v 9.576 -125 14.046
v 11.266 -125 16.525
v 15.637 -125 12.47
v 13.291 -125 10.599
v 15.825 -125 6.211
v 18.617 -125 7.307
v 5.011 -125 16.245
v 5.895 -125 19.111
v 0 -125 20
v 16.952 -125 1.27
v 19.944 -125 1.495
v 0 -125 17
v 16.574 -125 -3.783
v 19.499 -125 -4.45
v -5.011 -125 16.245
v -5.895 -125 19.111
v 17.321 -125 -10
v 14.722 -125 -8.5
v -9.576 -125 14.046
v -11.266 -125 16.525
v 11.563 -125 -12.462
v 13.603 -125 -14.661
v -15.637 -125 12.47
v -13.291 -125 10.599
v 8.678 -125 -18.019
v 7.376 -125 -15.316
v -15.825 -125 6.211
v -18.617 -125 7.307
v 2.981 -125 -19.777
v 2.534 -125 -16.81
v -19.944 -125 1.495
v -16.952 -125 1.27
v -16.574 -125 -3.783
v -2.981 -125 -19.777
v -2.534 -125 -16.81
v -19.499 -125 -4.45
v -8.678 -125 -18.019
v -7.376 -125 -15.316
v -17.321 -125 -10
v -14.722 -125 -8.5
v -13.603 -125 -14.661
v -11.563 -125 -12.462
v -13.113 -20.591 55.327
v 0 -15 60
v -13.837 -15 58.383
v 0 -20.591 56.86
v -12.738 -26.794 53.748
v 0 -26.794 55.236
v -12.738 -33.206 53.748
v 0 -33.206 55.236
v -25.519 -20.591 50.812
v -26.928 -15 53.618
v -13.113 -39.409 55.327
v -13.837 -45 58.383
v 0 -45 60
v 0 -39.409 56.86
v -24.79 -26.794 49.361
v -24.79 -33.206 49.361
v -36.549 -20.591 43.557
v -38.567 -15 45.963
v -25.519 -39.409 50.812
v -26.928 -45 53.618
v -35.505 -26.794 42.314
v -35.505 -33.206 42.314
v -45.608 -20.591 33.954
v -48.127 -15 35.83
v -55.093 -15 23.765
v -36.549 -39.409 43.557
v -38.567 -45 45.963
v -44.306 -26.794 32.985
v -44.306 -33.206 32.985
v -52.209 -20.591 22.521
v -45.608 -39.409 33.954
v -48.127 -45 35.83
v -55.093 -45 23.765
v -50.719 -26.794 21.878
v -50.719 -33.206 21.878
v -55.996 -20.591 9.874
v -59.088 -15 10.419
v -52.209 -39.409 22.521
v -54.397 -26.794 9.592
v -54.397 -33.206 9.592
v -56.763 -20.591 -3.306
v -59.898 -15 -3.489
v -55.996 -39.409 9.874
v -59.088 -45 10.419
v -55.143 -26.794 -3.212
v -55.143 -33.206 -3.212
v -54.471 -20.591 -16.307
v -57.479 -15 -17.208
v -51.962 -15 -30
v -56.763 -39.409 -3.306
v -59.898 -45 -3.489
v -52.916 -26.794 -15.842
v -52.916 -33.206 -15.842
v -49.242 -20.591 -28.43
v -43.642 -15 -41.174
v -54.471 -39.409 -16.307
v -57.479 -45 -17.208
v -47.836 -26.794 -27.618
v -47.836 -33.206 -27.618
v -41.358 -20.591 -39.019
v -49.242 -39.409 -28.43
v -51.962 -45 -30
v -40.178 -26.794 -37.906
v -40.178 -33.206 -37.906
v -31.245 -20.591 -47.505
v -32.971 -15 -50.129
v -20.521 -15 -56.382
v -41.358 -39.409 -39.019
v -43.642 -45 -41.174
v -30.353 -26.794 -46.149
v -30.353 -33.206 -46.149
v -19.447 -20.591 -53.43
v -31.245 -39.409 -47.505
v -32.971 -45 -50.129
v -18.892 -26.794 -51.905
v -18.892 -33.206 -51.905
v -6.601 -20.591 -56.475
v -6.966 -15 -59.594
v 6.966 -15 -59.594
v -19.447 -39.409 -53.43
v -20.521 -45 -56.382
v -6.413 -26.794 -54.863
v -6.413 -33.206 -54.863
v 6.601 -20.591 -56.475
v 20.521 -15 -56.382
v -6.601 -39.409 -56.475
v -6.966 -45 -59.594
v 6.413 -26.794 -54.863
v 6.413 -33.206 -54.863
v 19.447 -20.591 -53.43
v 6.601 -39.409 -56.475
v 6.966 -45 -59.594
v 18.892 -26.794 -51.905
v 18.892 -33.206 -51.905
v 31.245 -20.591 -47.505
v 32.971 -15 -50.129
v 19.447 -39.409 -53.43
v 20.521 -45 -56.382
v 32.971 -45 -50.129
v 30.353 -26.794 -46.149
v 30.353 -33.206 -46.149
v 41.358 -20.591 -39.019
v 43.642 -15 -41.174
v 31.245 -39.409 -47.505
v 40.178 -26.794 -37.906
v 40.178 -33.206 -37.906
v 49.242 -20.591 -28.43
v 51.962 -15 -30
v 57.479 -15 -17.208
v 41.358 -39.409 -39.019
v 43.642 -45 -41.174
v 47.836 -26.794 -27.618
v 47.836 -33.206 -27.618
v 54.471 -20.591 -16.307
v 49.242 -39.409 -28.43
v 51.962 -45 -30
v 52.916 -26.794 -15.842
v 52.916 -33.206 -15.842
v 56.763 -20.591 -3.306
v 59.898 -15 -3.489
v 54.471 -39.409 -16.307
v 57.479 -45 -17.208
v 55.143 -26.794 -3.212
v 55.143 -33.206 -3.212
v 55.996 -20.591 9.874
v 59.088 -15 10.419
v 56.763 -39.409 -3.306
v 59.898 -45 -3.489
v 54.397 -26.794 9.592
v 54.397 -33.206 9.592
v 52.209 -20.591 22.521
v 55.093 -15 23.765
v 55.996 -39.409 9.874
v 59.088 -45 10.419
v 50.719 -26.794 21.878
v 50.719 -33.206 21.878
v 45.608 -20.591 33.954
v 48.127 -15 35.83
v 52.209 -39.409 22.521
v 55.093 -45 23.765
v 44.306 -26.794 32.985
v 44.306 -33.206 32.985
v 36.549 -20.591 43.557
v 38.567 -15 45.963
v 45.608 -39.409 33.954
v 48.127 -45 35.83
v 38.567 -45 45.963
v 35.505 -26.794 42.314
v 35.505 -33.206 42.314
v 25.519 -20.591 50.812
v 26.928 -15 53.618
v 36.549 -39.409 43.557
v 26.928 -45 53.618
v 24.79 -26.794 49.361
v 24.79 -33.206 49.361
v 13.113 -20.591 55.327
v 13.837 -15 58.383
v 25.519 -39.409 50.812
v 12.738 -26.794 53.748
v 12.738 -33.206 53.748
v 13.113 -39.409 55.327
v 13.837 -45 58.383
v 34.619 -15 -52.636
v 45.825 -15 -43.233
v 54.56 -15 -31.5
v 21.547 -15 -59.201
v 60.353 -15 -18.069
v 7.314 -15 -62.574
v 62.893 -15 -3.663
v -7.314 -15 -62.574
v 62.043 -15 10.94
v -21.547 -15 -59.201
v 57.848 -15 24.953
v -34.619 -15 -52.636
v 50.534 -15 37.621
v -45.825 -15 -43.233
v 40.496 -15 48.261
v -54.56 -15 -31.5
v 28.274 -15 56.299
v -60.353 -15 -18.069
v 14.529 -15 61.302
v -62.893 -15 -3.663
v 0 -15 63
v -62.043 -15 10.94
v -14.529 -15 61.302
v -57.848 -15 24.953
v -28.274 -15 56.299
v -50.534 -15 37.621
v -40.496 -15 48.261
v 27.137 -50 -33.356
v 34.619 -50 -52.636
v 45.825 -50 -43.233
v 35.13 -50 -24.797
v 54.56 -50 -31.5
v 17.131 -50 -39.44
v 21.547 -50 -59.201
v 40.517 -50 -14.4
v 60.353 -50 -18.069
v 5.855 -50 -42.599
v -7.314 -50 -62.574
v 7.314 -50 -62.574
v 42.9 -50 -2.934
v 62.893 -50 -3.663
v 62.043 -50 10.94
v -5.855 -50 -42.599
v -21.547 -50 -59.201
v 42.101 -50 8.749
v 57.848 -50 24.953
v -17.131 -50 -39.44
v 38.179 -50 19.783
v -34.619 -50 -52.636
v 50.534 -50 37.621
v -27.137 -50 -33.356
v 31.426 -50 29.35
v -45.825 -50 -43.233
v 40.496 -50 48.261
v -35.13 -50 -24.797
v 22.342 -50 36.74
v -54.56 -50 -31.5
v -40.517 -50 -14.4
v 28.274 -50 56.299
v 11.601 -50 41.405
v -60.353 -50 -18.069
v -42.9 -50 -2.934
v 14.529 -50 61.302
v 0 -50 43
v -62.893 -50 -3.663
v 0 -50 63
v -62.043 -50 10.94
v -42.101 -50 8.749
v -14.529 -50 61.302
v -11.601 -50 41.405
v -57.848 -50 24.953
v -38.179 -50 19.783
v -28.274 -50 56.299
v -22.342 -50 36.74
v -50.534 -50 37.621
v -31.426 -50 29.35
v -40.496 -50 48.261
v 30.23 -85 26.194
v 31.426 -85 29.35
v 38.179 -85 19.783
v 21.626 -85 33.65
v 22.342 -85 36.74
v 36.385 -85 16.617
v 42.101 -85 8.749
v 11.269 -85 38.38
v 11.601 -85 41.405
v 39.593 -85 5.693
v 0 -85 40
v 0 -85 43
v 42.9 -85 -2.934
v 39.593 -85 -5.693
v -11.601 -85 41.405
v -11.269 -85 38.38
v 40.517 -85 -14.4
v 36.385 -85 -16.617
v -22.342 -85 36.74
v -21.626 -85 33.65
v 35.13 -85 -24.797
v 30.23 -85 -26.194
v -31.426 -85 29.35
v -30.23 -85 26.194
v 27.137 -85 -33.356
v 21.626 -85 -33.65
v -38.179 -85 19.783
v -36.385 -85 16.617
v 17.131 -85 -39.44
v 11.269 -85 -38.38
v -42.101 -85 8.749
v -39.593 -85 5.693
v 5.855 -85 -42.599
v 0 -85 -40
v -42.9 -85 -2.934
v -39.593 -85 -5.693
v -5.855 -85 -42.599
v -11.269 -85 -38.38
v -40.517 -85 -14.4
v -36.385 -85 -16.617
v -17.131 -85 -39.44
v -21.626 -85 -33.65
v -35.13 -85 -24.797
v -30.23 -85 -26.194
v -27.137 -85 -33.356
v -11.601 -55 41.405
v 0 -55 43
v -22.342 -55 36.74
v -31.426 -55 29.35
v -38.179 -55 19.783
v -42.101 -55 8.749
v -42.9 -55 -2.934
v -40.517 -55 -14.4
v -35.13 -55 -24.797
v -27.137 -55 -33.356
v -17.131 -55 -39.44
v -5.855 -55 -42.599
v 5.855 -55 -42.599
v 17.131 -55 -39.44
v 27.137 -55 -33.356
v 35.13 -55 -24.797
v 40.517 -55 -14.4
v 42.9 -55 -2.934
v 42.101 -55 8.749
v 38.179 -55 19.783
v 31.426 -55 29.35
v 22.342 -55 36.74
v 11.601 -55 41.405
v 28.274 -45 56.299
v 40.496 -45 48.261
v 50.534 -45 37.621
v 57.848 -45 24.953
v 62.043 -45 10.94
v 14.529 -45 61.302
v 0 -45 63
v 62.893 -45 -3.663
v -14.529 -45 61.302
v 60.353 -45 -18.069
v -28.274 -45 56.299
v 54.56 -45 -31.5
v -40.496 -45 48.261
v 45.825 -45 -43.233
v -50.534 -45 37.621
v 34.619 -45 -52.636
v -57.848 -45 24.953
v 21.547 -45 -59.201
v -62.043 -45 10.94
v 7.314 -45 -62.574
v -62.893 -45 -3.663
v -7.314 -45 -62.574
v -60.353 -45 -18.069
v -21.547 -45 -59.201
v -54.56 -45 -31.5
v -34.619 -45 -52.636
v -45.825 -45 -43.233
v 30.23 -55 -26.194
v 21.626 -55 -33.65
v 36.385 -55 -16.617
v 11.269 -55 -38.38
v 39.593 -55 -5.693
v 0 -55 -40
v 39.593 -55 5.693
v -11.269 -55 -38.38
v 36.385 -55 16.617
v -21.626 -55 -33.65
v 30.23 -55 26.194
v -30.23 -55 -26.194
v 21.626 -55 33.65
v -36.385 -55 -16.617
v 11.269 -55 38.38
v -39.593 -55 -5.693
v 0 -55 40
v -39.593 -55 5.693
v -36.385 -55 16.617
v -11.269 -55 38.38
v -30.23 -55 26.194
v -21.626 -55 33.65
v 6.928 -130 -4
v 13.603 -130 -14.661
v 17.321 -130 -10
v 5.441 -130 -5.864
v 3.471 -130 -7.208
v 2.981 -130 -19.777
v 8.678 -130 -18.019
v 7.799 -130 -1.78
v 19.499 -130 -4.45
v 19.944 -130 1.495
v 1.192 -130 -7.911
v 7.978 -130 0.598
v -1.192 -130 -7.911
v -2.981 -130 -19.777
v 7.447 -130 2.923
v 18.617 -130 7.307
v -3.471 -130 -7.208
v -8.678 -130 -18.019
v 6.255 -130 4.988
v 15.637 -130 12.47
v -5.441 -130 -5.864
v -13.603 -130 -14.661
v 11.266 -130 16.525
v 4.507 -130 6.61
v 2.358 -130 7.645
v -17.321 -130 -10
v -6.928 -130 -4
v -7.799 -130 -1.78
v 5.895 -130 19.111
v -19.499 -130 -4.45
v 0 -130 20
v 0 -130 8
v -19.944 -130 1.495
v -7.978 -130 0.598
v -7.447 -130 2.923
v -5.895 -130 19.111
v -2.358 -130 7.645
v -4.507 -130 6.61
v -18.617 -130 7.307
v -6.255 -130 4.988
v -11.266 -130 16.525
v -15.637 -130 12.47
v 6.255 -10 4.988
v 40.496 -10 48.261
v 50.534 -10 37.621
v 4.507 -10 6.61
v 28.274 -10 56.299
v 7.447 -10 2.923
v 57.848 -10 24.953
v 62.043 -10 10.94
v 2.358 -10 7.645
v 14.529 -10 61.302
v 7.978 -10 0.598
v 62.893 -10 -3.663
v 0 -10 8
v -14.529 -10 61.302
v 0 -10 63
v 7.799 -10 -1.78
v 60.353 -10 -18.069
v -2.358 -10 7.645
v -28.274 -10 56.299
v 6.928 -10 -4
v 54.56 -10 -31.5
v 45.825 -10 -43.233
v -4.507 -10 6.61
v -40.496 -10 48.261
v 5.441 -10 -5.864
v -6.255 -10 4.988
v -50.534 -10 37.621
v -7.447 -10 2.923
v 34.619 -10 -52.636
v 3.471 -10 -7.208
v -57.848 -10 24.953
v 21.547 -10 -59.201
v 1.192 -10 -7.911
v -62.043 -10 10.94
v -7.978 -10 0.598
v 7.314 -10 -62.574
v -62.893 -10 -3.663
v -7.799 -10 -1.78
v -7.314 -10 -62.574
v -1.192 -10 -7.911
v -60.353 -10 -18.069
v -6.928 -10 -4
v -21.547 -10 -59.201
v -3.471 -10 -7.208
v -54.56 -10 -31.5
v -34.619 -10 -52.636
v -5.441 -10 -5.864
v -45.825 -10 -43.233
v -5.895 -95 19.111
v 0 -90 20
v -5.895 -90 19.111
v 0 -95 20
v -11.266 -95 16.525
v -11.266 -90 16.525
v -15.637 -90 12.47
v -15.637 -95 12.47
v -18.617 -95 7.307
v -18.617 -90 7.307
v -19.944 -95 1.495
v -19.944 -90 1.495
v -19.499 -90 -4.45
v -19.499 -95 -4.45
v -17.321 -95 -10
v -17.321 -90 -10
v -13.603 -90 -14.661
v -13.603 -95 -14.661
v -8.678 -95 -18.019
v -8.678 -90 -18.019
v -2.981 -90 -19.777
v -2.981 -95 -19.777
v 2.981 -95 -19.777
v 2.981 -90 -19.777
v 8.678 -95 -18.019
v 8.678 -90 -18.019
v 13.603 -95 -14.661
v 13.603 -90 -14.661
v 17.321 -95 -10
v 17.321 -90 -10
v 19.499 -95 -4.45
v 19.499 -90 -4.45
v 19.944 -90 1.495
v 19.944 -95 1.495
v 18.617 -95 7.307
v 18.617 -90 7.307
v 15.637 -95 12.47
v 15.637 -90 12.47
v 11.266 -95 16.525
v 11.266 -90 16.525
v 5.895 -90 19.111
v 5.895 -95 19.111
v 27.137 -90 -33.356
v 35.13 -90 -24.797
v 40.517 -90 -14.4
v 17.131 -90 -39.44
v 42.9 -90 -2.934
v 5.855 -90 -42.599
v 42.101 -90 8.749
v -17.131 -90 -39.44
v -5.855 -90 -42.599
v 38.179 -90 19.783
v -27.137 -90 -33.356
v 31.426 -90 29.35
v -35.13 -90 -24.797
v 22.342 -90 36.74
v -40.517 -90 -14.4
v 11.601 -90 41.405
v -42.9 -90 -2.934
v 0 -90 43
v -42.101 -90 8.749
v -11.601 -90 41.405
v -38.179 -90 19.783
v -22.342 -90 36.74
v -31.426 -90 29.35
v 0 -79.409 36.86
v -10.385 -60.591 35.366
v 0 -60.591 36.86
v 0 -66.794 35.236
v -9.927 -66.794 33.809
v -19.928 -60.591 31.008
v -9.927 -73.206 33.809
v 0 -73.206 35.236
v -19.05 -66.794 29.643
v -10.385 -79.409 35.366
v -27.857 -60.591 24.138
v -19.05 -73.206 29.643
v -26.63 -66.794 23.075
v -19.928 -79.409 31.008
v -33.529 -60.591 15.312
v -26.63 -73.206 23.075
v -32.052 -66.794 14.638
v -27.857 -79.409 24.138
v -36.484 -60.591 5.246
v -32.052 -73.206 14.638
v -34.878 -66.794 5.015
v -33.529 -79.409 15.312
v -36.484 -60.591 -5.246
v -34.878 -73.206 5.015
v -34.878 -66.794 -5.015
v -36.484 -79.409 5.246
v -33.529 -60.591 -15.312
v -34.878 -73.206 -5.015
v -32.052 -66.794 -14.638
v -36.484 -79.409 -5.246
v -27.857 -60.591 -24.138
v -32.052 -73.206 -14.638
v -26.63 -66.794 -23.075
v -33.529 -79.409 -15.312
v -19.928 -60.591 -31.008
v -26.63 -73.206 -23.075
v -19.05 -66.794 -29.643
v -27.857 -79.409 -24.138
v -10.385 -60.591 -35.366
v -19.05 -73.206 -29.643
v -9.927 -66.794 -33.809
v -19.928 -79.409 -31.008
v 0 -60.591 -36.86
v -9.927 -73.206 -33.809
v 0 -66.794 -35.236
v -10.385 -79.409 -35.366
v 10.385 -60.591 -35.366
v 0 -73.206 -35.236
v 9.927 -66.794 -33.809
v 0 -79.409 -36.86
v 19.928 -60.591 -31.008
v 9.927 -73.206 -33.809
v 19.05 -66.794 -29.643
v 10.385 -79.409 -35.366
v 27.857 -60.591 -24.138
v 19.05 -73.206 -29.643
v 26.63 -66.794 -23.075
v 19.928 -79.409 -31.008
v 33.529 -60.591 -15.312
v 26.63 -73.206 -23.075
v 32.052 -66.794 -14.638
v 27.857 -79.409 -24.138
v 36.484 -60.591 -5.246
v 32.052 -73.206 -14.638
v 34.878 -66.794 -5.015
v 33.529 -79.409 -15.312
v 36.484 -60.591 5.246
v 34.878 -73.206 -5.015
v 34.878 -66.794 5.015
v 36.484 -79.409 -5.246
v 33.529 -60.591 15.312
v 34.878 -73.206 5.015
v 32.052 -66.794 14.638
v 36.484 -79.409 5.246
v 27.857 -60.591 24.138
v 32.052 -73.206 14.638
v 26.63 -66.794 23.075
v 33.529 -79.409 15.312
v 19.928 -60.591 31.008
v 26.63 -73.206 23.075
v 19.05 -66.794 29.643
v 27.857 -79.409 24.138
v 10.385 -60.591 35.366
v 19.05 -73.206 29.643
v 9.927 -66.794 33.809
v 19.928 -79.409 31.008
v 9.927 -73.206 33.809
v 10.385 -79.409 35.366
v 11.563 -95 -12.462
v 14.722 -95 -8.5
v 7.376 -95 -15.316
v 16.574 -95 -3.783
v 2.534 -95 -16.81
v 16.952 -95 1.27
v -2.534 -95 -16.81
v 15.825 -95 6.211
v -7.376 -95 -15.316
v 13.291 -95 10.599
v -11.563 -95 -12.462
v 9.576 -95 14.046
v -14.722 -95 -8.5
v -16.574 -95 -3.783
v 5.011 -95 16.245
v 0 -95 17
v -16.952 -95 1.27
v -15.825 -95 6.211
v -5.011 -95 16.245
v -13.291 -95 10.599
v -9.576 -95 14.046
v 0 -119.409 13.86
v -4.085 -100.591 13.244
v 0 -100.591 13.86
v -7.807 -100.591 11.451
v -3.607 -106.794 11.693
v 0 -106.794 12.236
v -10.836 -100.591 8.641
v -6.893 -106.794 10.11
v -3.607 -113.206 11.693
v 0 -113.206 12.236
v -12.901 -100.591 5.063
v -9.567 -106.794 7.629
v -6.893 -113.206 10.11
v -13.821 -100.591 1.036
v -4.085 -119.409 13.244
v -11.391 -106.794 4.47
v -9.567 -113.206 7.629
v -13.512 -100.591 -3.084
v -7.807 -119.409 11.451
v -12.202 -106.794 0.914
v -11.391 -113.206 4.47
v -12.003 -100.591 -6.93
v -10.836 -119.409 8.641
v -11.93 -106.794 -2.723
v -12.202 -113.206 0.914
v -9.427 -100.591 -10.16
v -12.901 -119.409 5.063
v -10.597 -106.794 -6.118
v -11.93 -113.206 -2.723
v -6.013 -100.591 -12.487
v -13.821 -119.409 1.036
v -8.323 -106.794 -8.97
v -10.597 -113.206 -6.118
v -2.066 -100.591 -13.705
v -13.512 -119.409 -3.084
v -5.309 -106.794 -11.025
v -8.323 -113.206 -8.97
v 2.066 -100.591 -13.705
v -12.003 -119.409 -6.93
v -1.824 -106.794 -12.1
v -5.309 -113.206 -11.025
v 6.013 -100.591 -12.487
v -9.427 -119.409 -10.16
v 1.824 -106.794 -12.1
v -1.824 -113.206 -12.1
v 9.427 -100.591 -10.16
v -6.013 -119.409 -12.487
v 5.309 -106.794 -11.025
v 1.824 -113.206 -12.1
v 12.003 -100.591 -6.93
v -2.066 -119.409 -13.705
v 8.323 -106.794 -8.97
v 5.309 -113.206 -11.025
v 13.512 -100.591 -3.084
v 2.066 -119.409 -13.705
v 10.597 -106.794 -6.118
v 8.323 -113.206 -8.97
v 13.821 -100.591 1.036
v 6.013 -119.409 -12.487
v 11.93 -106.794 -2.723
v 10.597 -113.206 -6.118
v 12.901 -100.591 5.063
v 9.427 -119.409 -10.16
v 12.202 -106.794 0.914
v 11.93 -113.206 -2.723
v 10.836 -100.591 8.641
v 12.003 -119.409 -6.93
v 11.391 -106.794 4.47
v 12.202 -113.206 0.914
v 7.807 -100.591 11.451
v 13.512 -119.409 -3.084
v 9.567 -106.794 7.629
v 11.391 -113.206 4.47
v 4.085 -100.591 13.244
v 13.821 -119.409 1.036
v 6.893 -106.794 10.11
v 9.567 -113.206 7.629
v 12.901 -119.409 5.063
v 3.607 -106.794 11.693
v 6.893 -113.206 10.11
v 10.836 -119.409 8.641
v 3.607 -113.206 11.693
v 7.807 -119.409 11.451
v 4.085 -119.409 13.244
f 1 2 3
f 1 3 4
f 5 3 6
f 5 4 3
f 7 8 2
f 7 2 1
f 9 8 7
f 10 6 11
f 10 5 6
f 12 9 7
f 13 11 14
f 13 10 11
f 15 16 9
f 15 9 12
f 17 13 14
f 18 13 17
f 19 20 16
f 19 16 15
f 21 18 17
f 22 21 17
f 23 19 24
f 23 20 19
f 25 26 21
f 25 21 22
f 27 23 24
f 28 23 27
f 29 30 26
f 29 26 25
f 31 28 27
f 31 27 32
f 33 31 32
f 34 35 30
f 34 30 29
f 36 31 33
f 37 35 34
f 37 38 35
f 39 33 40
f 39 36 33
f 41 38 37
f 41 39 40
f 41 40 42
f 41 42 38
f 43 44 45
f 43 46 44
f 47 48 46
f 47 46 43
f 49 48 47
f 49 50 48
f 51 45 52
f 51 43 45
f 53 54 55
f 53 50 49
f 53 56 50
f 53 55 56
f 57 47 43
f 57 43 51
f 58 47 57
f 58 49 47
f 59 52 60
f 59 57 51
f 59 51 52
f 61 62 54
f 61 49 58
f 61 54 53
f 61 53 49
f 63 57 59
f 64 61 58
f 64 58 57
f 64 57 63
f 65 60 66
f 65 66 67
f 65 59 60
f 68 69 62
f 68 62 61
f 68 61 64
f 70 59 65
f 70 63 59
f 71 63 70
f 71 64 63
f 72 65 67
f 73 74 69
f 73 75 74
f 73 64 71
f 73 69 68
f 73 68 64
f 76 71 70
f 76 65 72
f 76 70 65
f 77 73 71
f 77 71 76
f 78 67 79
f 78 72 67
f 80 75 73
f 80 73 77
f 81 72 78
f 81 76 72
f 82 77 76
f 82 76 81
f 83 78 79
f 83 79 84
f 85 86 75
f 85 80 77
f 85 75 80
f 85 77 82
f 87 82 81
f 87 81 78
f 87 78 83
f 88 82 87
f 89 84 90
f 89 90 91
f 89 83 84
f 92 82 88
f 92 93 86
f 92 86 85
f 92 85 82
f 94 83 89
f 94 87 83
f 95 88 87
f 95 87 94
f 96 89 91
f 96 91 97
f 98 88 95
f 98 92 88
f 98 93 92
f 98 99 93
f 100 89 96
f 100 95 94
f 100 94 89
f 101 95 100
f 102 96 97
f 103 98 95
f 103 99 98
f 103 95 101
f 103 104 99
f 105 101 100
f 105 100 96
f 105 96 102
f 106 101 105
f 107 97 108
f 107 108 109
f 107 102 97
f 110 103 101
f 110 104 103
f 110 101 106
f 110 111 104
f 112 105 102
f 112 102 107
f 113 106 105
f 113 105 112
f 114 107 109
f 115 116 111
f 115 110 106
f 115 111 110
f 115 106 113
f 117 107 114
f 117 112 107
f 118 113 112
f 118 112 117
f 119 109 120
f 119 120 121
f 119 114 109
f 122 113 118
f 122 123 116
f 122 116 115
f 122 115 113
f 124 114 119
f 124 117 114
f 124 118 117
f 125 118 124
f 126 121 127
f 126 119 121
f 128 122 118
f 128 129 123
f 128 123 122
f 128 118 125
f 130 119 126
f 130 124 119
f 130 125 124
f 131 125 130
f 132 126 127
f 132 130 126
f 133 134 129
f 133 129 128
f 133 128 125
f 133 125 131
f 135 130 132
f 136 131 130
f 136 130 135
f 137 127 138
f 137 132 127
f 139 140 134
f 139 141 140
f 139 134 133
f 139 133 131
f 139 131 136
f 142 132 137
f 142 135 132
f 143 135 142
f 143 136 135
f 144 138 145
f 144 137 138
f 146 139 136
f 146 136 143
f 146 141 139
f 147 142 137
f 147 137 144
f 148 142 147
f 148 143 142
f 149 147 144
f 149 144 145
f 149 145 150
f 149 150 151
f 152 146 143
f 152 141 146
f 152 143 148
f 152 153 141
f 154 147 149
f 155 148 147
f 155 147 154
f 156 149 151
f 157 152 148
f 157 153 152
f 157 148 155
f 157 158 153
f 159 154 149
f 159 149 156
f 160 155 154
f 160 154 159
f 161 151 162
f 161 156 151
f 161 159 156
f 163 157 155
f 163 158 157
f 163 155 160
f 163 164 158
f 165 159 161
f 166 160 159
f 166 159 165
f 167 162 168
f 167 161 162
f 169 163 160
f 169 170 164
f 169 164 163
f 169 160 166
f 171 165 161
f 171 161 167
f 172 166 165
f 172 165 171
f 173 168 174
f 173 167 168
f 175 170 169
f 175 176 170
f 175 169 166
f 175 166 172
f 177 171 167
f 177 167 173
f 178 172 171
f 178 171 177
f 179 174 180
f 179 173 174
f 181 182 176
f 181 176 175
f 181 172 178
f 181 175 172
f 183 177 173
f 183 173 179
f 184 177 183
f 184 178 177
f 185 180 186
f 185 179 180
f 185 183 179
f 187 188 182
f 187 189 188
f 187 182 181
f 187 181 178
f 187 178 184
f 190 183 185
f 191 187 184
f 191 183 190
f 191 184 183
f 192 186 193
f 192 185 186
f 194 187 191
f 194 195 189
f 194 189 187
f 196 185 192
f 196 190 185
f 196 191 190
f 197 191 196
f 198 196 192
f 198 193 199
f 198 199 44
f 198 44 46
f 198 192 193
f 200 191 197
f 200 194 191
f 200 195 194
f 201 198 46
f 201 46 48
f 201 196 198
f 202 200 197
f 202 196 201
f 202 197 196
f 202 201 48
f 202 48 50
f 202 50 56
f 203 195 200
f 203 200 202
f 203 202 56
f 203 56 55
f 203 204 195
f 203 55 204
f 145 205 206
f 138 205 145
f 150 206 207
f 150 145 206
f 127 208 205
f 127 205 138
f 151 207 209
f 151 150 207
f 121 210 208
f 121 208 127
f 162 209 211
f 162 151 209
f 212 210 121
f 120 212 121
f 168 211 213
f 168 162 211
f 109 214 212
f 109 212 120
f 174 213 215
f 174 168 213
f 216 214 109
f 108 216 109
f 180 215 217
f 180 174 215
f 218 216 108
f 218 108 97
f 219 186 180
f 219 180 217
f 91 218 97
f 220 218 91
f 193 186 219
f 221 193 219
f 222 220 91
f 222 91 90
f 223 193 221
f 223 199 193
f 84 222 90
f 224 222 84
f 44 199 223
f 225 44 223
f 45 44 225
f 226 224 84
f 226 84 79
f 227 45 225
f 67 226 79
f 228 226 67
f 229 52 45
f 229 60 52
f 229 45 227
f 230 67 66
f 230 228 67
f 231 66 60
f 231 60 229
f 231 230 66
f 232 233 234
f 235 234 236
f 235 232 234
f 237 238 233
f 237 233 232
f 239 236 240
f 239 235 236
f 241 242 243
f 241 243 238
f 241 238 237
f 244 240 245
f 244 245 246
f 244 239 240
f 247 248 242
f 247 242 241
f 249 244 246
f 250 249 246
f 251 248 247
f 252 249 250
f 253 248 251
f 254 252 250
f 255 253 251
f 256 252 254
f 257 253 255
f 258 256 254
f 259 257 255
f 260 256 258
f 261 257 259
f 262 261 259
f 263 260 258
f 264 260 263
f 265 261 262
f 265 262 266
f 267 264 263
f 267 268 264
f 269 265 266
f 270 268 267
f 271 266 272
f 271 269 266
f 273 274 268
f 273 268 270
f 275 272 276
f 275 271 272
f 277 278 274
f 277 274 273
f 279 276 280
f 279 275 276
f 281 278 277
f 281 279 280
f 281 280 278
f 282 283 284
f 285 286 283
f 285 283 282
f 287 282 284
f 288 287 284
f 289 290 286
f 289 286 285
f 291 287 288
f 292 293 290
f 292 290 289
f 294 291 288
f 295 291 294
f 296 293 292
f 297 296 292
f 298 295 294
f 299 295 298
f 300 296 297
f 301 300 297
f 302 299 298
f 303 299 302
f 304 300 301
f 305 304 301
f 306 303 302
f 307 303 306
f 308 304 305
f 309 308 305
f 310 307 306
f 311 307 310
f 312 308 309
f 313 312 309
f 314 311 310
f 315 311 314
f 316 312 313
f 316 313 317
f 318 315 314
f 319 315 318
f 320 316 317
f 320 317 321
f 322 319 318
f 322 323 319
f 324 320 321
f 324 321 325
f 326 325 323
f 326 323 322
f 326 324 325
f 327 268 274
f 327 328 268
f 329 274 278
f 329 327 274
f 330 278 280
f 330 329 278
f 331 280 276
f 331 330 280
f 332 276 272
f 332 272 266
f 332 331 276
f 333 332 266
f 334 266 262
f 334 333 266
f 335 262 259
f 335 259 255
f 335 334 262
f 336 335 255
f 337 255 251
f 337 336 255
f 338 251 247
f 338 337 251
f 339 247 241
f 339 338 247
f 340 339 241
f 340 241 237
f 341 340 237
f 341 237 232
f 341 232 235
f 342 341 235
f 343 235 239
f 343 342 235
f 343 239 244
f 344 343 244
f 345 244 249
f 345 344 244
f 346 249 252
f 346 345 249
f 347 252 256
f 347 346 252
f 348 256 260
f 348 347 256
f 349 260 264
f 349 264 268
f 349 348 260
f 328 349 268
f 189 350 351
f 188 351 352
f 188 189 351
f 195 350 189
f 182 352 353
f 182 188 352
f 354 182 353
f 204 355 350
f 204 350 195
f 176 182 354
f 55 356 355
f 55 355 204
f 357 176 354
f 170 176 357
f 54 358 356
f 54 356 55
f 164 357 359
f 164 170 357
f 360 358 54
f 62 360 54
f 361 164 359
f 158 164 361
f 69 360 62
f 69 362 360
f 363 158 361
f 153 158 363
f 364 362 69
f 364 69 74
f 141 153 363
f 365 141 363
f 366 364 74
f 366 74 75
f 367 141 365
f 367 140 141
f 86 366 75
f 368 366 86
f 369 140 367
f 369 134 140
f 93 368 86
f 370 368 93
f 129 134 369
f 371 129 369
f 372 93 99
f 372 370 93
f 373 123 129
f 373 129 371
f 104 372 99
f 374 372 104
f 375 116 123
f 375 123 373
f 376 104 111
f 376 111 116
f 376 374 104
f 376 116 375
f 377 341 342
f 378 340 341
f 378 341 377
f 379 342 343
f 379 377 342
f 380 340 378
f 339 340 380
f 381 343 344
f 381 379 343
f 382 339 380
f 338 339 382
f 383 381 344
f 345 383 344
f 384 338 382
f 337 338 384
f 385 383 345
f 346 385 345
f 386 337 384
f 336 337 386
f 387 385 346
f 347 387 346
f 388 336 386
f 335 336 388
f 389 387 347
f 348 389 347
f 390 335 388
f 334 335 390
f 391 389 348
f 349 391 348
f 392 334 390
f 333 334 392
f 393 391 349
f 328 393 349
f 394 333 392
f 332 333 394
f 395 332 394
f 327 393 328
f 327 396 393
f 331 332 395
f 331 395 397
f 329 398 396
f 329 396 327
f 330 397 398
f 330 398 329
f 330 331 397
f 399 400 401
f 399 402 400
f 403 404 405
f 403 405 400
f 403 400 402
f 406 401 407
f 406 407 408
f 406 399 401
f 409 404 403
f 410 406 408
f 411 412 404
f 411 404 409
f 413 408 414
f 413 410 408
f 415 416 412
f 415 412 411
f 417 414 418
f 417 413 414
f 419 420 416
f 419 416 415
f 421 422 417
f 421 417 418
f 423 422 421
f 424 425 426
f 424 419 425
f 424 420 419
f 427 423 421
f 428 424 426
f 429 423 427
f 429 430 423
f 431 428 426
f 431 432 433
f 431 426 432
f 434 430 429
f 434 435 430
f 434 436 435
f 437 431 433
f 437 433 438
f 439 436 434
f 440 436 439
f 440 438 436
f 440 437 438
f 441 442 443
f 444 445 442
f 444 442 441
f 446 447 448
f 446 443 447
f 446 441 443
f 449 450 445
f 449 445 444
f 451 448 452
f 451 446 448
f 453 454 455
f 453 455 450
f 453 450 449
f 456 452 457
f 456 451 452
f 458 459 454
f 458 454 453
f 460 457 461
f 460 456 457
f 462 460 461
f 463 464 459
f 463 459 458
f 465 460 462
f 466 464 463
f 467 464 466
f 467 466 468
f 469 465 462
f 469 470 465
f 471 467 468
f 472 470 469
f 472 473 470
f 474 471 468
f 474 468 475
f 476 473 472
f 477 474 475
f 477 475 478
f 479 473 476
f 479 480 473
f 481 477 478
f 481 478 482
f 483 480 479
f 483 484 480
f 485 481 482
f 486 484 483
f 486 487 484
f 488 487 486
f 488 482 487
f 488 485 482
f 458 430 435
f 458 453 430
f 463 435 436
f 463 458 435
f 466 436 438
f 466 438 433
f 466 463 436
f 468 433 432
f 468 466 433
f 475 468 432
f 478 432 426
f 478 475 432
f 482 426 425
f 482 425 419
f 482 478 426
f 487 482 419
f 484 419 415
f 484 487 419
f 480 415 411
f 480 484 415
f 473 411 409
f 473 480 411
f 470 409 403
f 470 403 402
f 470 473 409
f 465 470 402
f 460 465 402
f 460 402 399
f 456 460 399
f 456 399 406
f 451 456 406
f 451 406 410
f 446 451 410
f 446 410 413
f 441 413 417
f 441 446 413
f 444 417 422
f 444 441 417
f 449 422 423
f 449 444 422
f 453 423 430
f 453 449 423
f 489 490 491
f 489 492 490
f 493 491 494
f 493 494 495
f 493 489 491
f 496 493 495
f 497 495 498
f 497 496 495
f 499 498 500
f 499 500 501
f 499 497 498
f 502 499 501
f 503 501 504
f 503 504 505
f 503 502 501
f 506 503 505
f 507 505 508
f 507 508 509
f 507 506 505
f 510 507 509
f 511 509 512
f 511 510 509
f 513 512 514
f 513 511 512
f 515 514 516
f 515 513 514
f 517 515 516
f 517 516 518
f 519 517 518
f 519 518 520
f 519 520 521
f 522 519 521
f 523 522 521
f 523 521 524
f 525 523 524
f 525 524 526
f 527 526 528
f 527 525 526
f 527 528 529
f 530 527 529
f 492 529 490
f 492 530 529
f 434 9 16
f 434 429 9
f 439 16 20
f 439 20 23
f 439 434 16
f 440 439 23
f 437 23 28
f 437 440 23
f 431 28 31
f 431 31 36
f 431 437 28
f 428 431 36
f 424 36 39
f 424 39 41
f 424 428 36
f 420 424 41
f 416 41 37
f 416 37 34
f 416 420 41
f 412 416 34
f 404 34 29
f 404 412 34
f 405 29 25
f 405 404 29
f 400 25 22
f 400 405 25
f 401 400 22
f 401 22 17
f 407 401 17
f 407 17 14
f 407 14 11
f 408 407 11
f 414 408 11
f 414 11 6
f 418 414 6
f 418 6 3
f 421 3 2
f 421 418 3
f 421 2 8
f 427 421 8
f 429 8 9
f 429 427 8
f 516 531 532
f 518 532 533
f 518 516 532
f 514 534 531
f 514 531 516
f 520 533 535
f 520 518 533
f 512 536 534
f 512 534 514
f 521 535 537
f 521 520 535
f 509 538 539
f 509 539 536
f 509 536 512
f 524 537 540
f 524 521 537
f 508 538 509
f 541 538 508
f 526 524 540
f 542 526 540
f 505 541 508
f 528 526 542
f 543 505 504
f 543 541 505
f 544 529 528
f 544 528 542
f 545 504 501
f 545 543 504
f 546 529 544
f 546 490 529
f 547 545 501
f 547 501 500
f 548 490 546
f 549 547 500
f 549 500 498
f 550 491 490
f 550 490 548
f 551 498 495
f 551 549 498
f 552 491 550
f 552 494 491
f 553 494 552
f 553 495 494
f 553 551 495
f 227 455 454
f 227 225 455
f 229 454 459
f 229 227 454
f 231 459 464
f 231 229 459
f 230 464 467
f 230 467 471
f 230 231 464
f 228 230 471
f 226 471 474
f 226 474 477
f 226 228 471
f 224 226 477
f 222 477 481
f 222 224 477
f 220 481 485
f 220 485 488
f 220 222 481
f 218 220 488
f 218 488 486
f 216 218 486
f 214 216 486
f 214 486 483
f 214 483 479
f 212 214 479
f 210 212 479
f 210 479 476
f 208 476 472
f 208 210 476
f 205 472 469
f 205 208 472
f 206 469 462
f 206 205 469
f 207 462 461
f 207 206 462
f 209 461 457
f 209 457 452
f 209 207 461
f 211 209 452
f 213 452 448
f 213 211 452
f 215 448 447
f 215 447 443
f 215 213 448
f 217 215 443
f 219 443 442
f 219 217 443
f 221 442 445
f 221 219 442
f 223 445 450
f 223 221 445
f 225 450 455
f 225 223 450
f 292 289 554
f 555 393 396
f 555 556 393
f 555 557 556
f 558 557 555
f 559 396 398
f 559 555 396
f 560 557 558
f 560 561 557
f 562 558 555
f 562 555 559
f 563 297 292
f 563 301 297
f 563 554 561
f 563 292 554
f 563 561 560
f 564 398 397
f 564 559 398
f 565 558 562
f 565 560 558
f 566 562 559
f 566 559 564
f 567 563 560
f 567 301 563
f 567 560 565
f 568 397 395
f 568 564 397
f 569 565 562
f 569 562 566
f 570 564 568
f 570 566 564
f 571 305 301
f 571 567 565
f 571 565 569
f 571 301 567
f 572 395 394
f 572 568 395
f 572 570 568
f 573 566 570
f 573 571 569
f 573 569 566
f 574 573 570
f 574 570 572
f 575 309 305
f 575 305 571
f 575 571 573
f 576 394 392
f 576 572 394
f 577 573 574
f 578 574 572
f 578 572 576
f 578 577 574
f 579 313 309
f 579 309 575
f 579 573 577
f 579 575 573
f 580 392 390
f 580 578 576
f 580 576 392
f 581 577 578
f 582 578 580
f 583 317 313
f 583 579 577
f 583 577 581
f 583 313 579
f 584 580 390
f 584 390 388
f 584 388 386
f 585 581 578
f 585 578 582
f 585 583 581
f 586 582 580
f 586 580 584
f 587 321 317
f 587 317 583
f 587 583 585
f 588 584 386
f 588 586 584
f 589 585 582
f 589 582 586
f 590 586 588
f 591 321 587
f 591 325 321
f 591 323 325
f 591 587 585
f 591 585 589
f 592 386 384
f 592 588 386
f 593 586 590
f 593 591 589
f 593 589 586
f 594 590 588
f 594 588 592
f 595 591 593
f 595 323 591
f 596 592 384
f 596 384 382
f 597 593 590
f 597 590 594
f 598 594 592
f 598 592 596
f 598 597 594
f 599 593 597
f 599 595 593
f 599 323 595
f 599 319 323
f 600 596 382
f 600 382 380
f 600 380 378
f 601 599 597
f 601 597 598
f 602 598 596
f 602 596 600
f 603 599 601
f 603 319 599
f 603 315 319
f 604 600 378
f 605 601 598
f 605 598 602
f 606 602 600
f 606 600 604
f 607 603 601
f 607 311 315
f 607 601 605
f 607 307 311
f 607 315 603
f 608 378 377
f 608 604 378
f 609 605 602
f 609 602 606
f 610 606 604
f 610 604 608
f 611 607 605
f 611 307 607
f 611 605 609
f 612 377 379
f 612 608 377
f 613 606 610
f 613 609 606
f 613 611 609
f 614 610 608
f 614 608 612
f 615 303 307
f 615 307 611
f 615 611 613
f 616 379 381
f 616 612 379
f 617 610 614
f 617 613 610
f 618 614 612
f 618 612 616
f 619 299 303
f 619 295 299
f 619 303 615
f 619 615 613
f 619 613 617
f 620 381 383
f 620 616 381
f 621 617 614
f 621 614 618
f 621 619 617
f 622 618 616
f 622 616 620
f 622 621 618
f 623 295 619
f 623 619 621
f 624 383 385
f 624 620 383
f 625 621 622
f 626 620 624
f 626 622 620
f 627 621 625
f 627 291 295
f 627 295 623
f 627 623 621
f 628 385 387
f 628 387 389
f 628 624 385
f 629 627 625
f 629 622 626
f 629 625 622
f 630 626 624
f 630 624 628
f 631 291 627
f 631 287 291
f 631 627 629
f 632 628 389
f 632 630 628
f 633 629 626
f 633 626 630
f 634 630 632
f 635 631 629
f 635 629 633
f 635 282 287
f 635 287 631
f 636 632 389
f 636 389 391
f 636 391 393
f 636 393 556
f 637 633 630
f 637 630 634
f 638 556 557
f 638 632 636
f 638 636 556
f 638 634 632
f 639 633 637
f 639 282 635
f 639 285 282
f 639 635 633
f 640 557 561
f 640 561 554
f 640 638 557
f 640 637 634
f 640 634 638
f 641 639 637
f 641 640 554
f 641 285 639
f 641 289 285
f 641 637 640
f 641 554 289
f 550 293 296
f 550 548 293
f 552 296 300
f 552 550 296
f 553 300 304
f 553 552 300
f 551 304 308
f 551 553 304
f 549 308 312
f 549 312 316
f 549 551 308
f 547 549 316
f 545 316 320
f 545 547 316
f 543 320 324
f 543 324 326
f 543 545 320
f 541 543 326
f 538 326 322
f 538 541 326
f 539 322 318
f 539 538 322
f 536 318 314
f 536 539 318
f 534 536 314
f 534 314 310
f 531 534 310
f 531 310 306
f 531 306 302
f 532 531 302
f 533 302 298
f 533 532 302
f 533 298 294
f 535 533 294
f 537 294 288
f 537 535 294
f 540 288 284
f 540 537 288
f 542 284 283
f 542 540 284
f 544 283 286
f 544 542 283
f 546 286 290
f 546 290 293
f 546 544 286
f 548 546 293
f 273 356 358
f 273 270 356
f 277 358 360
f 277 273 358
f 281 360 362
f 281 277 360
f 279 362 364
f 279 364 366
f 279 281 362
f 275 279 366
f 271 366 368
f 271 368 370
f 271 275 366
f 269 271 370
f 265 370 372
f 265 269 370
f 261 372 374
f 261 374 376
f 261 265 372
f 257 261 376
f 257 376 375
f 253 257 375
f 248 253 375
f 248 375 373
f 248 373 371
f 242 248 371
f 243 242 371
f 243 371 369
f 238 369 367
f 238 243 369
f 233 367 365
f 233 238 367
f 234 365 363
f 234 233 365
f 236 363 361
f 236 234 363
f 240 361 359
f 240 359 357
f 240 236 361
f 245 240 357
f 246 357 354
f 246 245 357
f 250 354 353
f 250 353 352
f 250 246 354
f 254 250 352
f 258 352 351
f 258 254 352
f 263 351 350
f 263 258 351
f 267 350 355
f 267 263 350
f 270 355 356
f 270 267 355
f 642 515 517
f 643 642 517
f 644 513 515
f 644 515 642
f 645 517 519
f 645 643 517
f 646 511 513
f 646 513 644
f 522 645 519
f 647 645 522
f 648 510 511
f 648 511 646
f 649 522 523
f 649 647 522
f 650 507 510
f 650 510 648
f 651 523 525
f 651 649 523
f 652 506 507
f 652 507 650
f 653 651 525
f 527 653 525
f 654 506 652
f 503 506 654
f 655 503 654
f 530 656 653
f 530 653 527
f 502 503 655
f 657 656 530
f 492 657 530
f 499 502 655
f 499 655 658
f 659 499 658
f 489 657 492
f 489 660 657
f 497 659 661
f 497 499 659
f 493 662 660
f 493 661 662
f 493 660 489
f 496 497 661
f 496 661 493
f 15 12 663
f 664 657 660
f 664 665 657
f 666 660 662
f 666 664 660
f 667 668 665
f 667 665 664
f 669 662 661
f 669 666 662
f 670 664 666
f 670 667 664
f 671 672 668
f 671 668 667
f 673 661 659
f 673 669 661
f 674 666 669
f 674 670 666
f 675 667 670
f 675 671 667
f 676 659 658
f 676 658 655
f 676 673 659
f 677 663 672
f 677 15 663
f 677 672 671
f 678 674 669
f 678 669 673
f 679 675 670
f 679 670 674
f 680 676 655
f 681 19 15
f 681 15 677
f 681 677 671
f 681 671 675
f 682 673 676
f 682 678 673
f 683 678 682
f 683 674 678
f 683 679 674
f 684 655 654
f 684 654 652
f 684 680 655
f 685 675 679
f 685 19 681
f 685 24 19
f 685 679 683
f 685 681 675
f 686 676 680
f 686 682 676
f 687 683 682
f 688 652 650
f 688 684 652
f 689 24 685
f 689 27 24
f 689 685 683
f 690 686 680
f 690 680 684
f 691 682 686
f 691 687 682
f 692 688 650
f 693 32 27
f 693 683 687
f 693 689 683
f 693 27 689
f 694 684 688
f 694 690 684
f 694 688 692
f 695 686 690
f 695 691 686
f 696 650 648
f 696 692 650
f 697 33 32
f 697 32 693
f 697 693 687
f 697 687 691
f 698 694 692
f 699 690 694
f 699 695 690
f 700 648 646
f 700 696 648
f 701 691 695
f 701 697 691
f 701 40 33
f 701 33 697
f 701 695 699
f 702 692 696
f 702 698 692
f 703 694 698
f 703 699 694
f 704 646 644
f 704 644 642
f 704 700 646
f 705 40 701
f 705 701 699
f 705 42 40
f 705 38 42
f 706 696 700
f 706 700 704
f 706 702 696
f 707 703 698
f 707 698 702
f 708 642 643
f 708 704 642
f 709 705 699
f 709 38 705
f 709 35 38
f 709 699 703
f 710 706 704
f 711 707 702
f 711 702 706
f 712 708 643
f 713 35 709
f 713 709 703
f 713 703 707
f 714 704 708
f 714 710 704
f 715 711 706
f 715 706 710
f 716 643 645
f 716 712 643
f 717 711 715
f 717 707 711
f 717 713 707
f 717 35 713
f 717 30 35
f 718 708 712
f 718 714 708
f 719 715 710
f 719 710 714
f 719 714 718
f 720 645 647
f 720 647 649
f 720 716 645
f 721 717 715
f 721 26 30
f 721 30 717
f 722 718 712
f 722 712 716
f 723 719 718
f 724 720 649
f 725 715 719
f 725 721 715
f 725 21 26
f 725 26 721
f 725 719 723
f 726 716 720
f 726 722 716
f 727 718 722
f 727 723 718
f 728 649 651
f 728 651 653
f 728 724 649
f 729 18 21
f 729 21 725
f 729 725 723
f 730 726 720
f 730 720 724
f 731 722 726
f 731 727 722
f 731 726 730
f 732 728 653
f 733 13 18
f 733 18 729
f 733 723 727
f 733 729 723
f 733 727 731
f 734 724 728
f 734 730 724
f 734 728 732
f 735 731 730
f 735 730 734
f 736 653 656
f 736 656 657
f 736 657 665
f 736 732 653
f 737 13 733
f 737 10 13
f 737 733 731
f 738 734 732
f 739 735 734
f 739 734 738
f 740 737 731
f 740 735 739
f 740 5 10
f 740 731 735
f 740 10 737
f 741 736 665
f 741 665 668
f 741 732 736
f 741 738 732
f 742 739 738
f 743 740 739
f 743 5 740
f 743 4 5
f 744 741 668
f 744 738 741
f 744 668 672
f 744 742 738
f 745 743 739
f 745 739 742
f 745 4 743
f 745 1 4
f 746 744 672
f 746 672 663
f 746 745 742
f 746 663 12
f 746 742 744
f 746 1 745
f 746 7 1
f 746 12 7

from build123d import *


with BuildPart() as f1:
    # F0 (on Right) → F1 (revolve)
    with BuildSketch(Plane.YZ):
        Polygon((-15, 60), (-15, 8), (-10, 8), (-10, 63), (-15, 63), align=None)
        with BuildLine():
            Line((-45, 60), (-45, 8))
            Line((-45, 8), (-15, 8))
            Line((-15, 8), (-15, 60))
            ThreePointArc((-15, 60), (-30, 55.031032), (-45, 60))
        make_face()
        Polygon((-50, 8), (-45, 8), (-45, 60), (-45, 63), (-50, 63), (-50, 43), align=None)
        Polygon((-55, 8), (-50, 8), (-50, 43), (-55, 43), (-55, 40), align=None)
        with BuildLine():
            Line((-85, 8), (-55, 8))
            Line((-55, 8), (-55, 40))
            ThreePointArc((-55, 40), (-70, 35.031032), (-85, 40))
            Line((-85, 40), (-85, 8))
        make_face()
        Polygon((-90, 8), (-85, 8), (-85, 40), (-85, 43), (-90, 43), (-90, 20), align=None)
        Polygon((-95, 8), (-90, 8), (-90, 20), (-95, 20), (-95, 17), align=None)
        with BuildLine():
            Line((-125, 8), (-95, 8))
            Line((-95, 8), (-95, 17))
            ThreePointArc((-95, 17), (-110, 12.031032), (-125, 17))
            Line((-125, 17), (-125, 8))
        make_face()
        Polygon((-130, 8), (-125, 8), (-125, 17), (-125, 20), (-130, 20), align=None)
    revolve(axis=Axis((0, 30, 0), (0, -1, 0)))


solid = f1.part
